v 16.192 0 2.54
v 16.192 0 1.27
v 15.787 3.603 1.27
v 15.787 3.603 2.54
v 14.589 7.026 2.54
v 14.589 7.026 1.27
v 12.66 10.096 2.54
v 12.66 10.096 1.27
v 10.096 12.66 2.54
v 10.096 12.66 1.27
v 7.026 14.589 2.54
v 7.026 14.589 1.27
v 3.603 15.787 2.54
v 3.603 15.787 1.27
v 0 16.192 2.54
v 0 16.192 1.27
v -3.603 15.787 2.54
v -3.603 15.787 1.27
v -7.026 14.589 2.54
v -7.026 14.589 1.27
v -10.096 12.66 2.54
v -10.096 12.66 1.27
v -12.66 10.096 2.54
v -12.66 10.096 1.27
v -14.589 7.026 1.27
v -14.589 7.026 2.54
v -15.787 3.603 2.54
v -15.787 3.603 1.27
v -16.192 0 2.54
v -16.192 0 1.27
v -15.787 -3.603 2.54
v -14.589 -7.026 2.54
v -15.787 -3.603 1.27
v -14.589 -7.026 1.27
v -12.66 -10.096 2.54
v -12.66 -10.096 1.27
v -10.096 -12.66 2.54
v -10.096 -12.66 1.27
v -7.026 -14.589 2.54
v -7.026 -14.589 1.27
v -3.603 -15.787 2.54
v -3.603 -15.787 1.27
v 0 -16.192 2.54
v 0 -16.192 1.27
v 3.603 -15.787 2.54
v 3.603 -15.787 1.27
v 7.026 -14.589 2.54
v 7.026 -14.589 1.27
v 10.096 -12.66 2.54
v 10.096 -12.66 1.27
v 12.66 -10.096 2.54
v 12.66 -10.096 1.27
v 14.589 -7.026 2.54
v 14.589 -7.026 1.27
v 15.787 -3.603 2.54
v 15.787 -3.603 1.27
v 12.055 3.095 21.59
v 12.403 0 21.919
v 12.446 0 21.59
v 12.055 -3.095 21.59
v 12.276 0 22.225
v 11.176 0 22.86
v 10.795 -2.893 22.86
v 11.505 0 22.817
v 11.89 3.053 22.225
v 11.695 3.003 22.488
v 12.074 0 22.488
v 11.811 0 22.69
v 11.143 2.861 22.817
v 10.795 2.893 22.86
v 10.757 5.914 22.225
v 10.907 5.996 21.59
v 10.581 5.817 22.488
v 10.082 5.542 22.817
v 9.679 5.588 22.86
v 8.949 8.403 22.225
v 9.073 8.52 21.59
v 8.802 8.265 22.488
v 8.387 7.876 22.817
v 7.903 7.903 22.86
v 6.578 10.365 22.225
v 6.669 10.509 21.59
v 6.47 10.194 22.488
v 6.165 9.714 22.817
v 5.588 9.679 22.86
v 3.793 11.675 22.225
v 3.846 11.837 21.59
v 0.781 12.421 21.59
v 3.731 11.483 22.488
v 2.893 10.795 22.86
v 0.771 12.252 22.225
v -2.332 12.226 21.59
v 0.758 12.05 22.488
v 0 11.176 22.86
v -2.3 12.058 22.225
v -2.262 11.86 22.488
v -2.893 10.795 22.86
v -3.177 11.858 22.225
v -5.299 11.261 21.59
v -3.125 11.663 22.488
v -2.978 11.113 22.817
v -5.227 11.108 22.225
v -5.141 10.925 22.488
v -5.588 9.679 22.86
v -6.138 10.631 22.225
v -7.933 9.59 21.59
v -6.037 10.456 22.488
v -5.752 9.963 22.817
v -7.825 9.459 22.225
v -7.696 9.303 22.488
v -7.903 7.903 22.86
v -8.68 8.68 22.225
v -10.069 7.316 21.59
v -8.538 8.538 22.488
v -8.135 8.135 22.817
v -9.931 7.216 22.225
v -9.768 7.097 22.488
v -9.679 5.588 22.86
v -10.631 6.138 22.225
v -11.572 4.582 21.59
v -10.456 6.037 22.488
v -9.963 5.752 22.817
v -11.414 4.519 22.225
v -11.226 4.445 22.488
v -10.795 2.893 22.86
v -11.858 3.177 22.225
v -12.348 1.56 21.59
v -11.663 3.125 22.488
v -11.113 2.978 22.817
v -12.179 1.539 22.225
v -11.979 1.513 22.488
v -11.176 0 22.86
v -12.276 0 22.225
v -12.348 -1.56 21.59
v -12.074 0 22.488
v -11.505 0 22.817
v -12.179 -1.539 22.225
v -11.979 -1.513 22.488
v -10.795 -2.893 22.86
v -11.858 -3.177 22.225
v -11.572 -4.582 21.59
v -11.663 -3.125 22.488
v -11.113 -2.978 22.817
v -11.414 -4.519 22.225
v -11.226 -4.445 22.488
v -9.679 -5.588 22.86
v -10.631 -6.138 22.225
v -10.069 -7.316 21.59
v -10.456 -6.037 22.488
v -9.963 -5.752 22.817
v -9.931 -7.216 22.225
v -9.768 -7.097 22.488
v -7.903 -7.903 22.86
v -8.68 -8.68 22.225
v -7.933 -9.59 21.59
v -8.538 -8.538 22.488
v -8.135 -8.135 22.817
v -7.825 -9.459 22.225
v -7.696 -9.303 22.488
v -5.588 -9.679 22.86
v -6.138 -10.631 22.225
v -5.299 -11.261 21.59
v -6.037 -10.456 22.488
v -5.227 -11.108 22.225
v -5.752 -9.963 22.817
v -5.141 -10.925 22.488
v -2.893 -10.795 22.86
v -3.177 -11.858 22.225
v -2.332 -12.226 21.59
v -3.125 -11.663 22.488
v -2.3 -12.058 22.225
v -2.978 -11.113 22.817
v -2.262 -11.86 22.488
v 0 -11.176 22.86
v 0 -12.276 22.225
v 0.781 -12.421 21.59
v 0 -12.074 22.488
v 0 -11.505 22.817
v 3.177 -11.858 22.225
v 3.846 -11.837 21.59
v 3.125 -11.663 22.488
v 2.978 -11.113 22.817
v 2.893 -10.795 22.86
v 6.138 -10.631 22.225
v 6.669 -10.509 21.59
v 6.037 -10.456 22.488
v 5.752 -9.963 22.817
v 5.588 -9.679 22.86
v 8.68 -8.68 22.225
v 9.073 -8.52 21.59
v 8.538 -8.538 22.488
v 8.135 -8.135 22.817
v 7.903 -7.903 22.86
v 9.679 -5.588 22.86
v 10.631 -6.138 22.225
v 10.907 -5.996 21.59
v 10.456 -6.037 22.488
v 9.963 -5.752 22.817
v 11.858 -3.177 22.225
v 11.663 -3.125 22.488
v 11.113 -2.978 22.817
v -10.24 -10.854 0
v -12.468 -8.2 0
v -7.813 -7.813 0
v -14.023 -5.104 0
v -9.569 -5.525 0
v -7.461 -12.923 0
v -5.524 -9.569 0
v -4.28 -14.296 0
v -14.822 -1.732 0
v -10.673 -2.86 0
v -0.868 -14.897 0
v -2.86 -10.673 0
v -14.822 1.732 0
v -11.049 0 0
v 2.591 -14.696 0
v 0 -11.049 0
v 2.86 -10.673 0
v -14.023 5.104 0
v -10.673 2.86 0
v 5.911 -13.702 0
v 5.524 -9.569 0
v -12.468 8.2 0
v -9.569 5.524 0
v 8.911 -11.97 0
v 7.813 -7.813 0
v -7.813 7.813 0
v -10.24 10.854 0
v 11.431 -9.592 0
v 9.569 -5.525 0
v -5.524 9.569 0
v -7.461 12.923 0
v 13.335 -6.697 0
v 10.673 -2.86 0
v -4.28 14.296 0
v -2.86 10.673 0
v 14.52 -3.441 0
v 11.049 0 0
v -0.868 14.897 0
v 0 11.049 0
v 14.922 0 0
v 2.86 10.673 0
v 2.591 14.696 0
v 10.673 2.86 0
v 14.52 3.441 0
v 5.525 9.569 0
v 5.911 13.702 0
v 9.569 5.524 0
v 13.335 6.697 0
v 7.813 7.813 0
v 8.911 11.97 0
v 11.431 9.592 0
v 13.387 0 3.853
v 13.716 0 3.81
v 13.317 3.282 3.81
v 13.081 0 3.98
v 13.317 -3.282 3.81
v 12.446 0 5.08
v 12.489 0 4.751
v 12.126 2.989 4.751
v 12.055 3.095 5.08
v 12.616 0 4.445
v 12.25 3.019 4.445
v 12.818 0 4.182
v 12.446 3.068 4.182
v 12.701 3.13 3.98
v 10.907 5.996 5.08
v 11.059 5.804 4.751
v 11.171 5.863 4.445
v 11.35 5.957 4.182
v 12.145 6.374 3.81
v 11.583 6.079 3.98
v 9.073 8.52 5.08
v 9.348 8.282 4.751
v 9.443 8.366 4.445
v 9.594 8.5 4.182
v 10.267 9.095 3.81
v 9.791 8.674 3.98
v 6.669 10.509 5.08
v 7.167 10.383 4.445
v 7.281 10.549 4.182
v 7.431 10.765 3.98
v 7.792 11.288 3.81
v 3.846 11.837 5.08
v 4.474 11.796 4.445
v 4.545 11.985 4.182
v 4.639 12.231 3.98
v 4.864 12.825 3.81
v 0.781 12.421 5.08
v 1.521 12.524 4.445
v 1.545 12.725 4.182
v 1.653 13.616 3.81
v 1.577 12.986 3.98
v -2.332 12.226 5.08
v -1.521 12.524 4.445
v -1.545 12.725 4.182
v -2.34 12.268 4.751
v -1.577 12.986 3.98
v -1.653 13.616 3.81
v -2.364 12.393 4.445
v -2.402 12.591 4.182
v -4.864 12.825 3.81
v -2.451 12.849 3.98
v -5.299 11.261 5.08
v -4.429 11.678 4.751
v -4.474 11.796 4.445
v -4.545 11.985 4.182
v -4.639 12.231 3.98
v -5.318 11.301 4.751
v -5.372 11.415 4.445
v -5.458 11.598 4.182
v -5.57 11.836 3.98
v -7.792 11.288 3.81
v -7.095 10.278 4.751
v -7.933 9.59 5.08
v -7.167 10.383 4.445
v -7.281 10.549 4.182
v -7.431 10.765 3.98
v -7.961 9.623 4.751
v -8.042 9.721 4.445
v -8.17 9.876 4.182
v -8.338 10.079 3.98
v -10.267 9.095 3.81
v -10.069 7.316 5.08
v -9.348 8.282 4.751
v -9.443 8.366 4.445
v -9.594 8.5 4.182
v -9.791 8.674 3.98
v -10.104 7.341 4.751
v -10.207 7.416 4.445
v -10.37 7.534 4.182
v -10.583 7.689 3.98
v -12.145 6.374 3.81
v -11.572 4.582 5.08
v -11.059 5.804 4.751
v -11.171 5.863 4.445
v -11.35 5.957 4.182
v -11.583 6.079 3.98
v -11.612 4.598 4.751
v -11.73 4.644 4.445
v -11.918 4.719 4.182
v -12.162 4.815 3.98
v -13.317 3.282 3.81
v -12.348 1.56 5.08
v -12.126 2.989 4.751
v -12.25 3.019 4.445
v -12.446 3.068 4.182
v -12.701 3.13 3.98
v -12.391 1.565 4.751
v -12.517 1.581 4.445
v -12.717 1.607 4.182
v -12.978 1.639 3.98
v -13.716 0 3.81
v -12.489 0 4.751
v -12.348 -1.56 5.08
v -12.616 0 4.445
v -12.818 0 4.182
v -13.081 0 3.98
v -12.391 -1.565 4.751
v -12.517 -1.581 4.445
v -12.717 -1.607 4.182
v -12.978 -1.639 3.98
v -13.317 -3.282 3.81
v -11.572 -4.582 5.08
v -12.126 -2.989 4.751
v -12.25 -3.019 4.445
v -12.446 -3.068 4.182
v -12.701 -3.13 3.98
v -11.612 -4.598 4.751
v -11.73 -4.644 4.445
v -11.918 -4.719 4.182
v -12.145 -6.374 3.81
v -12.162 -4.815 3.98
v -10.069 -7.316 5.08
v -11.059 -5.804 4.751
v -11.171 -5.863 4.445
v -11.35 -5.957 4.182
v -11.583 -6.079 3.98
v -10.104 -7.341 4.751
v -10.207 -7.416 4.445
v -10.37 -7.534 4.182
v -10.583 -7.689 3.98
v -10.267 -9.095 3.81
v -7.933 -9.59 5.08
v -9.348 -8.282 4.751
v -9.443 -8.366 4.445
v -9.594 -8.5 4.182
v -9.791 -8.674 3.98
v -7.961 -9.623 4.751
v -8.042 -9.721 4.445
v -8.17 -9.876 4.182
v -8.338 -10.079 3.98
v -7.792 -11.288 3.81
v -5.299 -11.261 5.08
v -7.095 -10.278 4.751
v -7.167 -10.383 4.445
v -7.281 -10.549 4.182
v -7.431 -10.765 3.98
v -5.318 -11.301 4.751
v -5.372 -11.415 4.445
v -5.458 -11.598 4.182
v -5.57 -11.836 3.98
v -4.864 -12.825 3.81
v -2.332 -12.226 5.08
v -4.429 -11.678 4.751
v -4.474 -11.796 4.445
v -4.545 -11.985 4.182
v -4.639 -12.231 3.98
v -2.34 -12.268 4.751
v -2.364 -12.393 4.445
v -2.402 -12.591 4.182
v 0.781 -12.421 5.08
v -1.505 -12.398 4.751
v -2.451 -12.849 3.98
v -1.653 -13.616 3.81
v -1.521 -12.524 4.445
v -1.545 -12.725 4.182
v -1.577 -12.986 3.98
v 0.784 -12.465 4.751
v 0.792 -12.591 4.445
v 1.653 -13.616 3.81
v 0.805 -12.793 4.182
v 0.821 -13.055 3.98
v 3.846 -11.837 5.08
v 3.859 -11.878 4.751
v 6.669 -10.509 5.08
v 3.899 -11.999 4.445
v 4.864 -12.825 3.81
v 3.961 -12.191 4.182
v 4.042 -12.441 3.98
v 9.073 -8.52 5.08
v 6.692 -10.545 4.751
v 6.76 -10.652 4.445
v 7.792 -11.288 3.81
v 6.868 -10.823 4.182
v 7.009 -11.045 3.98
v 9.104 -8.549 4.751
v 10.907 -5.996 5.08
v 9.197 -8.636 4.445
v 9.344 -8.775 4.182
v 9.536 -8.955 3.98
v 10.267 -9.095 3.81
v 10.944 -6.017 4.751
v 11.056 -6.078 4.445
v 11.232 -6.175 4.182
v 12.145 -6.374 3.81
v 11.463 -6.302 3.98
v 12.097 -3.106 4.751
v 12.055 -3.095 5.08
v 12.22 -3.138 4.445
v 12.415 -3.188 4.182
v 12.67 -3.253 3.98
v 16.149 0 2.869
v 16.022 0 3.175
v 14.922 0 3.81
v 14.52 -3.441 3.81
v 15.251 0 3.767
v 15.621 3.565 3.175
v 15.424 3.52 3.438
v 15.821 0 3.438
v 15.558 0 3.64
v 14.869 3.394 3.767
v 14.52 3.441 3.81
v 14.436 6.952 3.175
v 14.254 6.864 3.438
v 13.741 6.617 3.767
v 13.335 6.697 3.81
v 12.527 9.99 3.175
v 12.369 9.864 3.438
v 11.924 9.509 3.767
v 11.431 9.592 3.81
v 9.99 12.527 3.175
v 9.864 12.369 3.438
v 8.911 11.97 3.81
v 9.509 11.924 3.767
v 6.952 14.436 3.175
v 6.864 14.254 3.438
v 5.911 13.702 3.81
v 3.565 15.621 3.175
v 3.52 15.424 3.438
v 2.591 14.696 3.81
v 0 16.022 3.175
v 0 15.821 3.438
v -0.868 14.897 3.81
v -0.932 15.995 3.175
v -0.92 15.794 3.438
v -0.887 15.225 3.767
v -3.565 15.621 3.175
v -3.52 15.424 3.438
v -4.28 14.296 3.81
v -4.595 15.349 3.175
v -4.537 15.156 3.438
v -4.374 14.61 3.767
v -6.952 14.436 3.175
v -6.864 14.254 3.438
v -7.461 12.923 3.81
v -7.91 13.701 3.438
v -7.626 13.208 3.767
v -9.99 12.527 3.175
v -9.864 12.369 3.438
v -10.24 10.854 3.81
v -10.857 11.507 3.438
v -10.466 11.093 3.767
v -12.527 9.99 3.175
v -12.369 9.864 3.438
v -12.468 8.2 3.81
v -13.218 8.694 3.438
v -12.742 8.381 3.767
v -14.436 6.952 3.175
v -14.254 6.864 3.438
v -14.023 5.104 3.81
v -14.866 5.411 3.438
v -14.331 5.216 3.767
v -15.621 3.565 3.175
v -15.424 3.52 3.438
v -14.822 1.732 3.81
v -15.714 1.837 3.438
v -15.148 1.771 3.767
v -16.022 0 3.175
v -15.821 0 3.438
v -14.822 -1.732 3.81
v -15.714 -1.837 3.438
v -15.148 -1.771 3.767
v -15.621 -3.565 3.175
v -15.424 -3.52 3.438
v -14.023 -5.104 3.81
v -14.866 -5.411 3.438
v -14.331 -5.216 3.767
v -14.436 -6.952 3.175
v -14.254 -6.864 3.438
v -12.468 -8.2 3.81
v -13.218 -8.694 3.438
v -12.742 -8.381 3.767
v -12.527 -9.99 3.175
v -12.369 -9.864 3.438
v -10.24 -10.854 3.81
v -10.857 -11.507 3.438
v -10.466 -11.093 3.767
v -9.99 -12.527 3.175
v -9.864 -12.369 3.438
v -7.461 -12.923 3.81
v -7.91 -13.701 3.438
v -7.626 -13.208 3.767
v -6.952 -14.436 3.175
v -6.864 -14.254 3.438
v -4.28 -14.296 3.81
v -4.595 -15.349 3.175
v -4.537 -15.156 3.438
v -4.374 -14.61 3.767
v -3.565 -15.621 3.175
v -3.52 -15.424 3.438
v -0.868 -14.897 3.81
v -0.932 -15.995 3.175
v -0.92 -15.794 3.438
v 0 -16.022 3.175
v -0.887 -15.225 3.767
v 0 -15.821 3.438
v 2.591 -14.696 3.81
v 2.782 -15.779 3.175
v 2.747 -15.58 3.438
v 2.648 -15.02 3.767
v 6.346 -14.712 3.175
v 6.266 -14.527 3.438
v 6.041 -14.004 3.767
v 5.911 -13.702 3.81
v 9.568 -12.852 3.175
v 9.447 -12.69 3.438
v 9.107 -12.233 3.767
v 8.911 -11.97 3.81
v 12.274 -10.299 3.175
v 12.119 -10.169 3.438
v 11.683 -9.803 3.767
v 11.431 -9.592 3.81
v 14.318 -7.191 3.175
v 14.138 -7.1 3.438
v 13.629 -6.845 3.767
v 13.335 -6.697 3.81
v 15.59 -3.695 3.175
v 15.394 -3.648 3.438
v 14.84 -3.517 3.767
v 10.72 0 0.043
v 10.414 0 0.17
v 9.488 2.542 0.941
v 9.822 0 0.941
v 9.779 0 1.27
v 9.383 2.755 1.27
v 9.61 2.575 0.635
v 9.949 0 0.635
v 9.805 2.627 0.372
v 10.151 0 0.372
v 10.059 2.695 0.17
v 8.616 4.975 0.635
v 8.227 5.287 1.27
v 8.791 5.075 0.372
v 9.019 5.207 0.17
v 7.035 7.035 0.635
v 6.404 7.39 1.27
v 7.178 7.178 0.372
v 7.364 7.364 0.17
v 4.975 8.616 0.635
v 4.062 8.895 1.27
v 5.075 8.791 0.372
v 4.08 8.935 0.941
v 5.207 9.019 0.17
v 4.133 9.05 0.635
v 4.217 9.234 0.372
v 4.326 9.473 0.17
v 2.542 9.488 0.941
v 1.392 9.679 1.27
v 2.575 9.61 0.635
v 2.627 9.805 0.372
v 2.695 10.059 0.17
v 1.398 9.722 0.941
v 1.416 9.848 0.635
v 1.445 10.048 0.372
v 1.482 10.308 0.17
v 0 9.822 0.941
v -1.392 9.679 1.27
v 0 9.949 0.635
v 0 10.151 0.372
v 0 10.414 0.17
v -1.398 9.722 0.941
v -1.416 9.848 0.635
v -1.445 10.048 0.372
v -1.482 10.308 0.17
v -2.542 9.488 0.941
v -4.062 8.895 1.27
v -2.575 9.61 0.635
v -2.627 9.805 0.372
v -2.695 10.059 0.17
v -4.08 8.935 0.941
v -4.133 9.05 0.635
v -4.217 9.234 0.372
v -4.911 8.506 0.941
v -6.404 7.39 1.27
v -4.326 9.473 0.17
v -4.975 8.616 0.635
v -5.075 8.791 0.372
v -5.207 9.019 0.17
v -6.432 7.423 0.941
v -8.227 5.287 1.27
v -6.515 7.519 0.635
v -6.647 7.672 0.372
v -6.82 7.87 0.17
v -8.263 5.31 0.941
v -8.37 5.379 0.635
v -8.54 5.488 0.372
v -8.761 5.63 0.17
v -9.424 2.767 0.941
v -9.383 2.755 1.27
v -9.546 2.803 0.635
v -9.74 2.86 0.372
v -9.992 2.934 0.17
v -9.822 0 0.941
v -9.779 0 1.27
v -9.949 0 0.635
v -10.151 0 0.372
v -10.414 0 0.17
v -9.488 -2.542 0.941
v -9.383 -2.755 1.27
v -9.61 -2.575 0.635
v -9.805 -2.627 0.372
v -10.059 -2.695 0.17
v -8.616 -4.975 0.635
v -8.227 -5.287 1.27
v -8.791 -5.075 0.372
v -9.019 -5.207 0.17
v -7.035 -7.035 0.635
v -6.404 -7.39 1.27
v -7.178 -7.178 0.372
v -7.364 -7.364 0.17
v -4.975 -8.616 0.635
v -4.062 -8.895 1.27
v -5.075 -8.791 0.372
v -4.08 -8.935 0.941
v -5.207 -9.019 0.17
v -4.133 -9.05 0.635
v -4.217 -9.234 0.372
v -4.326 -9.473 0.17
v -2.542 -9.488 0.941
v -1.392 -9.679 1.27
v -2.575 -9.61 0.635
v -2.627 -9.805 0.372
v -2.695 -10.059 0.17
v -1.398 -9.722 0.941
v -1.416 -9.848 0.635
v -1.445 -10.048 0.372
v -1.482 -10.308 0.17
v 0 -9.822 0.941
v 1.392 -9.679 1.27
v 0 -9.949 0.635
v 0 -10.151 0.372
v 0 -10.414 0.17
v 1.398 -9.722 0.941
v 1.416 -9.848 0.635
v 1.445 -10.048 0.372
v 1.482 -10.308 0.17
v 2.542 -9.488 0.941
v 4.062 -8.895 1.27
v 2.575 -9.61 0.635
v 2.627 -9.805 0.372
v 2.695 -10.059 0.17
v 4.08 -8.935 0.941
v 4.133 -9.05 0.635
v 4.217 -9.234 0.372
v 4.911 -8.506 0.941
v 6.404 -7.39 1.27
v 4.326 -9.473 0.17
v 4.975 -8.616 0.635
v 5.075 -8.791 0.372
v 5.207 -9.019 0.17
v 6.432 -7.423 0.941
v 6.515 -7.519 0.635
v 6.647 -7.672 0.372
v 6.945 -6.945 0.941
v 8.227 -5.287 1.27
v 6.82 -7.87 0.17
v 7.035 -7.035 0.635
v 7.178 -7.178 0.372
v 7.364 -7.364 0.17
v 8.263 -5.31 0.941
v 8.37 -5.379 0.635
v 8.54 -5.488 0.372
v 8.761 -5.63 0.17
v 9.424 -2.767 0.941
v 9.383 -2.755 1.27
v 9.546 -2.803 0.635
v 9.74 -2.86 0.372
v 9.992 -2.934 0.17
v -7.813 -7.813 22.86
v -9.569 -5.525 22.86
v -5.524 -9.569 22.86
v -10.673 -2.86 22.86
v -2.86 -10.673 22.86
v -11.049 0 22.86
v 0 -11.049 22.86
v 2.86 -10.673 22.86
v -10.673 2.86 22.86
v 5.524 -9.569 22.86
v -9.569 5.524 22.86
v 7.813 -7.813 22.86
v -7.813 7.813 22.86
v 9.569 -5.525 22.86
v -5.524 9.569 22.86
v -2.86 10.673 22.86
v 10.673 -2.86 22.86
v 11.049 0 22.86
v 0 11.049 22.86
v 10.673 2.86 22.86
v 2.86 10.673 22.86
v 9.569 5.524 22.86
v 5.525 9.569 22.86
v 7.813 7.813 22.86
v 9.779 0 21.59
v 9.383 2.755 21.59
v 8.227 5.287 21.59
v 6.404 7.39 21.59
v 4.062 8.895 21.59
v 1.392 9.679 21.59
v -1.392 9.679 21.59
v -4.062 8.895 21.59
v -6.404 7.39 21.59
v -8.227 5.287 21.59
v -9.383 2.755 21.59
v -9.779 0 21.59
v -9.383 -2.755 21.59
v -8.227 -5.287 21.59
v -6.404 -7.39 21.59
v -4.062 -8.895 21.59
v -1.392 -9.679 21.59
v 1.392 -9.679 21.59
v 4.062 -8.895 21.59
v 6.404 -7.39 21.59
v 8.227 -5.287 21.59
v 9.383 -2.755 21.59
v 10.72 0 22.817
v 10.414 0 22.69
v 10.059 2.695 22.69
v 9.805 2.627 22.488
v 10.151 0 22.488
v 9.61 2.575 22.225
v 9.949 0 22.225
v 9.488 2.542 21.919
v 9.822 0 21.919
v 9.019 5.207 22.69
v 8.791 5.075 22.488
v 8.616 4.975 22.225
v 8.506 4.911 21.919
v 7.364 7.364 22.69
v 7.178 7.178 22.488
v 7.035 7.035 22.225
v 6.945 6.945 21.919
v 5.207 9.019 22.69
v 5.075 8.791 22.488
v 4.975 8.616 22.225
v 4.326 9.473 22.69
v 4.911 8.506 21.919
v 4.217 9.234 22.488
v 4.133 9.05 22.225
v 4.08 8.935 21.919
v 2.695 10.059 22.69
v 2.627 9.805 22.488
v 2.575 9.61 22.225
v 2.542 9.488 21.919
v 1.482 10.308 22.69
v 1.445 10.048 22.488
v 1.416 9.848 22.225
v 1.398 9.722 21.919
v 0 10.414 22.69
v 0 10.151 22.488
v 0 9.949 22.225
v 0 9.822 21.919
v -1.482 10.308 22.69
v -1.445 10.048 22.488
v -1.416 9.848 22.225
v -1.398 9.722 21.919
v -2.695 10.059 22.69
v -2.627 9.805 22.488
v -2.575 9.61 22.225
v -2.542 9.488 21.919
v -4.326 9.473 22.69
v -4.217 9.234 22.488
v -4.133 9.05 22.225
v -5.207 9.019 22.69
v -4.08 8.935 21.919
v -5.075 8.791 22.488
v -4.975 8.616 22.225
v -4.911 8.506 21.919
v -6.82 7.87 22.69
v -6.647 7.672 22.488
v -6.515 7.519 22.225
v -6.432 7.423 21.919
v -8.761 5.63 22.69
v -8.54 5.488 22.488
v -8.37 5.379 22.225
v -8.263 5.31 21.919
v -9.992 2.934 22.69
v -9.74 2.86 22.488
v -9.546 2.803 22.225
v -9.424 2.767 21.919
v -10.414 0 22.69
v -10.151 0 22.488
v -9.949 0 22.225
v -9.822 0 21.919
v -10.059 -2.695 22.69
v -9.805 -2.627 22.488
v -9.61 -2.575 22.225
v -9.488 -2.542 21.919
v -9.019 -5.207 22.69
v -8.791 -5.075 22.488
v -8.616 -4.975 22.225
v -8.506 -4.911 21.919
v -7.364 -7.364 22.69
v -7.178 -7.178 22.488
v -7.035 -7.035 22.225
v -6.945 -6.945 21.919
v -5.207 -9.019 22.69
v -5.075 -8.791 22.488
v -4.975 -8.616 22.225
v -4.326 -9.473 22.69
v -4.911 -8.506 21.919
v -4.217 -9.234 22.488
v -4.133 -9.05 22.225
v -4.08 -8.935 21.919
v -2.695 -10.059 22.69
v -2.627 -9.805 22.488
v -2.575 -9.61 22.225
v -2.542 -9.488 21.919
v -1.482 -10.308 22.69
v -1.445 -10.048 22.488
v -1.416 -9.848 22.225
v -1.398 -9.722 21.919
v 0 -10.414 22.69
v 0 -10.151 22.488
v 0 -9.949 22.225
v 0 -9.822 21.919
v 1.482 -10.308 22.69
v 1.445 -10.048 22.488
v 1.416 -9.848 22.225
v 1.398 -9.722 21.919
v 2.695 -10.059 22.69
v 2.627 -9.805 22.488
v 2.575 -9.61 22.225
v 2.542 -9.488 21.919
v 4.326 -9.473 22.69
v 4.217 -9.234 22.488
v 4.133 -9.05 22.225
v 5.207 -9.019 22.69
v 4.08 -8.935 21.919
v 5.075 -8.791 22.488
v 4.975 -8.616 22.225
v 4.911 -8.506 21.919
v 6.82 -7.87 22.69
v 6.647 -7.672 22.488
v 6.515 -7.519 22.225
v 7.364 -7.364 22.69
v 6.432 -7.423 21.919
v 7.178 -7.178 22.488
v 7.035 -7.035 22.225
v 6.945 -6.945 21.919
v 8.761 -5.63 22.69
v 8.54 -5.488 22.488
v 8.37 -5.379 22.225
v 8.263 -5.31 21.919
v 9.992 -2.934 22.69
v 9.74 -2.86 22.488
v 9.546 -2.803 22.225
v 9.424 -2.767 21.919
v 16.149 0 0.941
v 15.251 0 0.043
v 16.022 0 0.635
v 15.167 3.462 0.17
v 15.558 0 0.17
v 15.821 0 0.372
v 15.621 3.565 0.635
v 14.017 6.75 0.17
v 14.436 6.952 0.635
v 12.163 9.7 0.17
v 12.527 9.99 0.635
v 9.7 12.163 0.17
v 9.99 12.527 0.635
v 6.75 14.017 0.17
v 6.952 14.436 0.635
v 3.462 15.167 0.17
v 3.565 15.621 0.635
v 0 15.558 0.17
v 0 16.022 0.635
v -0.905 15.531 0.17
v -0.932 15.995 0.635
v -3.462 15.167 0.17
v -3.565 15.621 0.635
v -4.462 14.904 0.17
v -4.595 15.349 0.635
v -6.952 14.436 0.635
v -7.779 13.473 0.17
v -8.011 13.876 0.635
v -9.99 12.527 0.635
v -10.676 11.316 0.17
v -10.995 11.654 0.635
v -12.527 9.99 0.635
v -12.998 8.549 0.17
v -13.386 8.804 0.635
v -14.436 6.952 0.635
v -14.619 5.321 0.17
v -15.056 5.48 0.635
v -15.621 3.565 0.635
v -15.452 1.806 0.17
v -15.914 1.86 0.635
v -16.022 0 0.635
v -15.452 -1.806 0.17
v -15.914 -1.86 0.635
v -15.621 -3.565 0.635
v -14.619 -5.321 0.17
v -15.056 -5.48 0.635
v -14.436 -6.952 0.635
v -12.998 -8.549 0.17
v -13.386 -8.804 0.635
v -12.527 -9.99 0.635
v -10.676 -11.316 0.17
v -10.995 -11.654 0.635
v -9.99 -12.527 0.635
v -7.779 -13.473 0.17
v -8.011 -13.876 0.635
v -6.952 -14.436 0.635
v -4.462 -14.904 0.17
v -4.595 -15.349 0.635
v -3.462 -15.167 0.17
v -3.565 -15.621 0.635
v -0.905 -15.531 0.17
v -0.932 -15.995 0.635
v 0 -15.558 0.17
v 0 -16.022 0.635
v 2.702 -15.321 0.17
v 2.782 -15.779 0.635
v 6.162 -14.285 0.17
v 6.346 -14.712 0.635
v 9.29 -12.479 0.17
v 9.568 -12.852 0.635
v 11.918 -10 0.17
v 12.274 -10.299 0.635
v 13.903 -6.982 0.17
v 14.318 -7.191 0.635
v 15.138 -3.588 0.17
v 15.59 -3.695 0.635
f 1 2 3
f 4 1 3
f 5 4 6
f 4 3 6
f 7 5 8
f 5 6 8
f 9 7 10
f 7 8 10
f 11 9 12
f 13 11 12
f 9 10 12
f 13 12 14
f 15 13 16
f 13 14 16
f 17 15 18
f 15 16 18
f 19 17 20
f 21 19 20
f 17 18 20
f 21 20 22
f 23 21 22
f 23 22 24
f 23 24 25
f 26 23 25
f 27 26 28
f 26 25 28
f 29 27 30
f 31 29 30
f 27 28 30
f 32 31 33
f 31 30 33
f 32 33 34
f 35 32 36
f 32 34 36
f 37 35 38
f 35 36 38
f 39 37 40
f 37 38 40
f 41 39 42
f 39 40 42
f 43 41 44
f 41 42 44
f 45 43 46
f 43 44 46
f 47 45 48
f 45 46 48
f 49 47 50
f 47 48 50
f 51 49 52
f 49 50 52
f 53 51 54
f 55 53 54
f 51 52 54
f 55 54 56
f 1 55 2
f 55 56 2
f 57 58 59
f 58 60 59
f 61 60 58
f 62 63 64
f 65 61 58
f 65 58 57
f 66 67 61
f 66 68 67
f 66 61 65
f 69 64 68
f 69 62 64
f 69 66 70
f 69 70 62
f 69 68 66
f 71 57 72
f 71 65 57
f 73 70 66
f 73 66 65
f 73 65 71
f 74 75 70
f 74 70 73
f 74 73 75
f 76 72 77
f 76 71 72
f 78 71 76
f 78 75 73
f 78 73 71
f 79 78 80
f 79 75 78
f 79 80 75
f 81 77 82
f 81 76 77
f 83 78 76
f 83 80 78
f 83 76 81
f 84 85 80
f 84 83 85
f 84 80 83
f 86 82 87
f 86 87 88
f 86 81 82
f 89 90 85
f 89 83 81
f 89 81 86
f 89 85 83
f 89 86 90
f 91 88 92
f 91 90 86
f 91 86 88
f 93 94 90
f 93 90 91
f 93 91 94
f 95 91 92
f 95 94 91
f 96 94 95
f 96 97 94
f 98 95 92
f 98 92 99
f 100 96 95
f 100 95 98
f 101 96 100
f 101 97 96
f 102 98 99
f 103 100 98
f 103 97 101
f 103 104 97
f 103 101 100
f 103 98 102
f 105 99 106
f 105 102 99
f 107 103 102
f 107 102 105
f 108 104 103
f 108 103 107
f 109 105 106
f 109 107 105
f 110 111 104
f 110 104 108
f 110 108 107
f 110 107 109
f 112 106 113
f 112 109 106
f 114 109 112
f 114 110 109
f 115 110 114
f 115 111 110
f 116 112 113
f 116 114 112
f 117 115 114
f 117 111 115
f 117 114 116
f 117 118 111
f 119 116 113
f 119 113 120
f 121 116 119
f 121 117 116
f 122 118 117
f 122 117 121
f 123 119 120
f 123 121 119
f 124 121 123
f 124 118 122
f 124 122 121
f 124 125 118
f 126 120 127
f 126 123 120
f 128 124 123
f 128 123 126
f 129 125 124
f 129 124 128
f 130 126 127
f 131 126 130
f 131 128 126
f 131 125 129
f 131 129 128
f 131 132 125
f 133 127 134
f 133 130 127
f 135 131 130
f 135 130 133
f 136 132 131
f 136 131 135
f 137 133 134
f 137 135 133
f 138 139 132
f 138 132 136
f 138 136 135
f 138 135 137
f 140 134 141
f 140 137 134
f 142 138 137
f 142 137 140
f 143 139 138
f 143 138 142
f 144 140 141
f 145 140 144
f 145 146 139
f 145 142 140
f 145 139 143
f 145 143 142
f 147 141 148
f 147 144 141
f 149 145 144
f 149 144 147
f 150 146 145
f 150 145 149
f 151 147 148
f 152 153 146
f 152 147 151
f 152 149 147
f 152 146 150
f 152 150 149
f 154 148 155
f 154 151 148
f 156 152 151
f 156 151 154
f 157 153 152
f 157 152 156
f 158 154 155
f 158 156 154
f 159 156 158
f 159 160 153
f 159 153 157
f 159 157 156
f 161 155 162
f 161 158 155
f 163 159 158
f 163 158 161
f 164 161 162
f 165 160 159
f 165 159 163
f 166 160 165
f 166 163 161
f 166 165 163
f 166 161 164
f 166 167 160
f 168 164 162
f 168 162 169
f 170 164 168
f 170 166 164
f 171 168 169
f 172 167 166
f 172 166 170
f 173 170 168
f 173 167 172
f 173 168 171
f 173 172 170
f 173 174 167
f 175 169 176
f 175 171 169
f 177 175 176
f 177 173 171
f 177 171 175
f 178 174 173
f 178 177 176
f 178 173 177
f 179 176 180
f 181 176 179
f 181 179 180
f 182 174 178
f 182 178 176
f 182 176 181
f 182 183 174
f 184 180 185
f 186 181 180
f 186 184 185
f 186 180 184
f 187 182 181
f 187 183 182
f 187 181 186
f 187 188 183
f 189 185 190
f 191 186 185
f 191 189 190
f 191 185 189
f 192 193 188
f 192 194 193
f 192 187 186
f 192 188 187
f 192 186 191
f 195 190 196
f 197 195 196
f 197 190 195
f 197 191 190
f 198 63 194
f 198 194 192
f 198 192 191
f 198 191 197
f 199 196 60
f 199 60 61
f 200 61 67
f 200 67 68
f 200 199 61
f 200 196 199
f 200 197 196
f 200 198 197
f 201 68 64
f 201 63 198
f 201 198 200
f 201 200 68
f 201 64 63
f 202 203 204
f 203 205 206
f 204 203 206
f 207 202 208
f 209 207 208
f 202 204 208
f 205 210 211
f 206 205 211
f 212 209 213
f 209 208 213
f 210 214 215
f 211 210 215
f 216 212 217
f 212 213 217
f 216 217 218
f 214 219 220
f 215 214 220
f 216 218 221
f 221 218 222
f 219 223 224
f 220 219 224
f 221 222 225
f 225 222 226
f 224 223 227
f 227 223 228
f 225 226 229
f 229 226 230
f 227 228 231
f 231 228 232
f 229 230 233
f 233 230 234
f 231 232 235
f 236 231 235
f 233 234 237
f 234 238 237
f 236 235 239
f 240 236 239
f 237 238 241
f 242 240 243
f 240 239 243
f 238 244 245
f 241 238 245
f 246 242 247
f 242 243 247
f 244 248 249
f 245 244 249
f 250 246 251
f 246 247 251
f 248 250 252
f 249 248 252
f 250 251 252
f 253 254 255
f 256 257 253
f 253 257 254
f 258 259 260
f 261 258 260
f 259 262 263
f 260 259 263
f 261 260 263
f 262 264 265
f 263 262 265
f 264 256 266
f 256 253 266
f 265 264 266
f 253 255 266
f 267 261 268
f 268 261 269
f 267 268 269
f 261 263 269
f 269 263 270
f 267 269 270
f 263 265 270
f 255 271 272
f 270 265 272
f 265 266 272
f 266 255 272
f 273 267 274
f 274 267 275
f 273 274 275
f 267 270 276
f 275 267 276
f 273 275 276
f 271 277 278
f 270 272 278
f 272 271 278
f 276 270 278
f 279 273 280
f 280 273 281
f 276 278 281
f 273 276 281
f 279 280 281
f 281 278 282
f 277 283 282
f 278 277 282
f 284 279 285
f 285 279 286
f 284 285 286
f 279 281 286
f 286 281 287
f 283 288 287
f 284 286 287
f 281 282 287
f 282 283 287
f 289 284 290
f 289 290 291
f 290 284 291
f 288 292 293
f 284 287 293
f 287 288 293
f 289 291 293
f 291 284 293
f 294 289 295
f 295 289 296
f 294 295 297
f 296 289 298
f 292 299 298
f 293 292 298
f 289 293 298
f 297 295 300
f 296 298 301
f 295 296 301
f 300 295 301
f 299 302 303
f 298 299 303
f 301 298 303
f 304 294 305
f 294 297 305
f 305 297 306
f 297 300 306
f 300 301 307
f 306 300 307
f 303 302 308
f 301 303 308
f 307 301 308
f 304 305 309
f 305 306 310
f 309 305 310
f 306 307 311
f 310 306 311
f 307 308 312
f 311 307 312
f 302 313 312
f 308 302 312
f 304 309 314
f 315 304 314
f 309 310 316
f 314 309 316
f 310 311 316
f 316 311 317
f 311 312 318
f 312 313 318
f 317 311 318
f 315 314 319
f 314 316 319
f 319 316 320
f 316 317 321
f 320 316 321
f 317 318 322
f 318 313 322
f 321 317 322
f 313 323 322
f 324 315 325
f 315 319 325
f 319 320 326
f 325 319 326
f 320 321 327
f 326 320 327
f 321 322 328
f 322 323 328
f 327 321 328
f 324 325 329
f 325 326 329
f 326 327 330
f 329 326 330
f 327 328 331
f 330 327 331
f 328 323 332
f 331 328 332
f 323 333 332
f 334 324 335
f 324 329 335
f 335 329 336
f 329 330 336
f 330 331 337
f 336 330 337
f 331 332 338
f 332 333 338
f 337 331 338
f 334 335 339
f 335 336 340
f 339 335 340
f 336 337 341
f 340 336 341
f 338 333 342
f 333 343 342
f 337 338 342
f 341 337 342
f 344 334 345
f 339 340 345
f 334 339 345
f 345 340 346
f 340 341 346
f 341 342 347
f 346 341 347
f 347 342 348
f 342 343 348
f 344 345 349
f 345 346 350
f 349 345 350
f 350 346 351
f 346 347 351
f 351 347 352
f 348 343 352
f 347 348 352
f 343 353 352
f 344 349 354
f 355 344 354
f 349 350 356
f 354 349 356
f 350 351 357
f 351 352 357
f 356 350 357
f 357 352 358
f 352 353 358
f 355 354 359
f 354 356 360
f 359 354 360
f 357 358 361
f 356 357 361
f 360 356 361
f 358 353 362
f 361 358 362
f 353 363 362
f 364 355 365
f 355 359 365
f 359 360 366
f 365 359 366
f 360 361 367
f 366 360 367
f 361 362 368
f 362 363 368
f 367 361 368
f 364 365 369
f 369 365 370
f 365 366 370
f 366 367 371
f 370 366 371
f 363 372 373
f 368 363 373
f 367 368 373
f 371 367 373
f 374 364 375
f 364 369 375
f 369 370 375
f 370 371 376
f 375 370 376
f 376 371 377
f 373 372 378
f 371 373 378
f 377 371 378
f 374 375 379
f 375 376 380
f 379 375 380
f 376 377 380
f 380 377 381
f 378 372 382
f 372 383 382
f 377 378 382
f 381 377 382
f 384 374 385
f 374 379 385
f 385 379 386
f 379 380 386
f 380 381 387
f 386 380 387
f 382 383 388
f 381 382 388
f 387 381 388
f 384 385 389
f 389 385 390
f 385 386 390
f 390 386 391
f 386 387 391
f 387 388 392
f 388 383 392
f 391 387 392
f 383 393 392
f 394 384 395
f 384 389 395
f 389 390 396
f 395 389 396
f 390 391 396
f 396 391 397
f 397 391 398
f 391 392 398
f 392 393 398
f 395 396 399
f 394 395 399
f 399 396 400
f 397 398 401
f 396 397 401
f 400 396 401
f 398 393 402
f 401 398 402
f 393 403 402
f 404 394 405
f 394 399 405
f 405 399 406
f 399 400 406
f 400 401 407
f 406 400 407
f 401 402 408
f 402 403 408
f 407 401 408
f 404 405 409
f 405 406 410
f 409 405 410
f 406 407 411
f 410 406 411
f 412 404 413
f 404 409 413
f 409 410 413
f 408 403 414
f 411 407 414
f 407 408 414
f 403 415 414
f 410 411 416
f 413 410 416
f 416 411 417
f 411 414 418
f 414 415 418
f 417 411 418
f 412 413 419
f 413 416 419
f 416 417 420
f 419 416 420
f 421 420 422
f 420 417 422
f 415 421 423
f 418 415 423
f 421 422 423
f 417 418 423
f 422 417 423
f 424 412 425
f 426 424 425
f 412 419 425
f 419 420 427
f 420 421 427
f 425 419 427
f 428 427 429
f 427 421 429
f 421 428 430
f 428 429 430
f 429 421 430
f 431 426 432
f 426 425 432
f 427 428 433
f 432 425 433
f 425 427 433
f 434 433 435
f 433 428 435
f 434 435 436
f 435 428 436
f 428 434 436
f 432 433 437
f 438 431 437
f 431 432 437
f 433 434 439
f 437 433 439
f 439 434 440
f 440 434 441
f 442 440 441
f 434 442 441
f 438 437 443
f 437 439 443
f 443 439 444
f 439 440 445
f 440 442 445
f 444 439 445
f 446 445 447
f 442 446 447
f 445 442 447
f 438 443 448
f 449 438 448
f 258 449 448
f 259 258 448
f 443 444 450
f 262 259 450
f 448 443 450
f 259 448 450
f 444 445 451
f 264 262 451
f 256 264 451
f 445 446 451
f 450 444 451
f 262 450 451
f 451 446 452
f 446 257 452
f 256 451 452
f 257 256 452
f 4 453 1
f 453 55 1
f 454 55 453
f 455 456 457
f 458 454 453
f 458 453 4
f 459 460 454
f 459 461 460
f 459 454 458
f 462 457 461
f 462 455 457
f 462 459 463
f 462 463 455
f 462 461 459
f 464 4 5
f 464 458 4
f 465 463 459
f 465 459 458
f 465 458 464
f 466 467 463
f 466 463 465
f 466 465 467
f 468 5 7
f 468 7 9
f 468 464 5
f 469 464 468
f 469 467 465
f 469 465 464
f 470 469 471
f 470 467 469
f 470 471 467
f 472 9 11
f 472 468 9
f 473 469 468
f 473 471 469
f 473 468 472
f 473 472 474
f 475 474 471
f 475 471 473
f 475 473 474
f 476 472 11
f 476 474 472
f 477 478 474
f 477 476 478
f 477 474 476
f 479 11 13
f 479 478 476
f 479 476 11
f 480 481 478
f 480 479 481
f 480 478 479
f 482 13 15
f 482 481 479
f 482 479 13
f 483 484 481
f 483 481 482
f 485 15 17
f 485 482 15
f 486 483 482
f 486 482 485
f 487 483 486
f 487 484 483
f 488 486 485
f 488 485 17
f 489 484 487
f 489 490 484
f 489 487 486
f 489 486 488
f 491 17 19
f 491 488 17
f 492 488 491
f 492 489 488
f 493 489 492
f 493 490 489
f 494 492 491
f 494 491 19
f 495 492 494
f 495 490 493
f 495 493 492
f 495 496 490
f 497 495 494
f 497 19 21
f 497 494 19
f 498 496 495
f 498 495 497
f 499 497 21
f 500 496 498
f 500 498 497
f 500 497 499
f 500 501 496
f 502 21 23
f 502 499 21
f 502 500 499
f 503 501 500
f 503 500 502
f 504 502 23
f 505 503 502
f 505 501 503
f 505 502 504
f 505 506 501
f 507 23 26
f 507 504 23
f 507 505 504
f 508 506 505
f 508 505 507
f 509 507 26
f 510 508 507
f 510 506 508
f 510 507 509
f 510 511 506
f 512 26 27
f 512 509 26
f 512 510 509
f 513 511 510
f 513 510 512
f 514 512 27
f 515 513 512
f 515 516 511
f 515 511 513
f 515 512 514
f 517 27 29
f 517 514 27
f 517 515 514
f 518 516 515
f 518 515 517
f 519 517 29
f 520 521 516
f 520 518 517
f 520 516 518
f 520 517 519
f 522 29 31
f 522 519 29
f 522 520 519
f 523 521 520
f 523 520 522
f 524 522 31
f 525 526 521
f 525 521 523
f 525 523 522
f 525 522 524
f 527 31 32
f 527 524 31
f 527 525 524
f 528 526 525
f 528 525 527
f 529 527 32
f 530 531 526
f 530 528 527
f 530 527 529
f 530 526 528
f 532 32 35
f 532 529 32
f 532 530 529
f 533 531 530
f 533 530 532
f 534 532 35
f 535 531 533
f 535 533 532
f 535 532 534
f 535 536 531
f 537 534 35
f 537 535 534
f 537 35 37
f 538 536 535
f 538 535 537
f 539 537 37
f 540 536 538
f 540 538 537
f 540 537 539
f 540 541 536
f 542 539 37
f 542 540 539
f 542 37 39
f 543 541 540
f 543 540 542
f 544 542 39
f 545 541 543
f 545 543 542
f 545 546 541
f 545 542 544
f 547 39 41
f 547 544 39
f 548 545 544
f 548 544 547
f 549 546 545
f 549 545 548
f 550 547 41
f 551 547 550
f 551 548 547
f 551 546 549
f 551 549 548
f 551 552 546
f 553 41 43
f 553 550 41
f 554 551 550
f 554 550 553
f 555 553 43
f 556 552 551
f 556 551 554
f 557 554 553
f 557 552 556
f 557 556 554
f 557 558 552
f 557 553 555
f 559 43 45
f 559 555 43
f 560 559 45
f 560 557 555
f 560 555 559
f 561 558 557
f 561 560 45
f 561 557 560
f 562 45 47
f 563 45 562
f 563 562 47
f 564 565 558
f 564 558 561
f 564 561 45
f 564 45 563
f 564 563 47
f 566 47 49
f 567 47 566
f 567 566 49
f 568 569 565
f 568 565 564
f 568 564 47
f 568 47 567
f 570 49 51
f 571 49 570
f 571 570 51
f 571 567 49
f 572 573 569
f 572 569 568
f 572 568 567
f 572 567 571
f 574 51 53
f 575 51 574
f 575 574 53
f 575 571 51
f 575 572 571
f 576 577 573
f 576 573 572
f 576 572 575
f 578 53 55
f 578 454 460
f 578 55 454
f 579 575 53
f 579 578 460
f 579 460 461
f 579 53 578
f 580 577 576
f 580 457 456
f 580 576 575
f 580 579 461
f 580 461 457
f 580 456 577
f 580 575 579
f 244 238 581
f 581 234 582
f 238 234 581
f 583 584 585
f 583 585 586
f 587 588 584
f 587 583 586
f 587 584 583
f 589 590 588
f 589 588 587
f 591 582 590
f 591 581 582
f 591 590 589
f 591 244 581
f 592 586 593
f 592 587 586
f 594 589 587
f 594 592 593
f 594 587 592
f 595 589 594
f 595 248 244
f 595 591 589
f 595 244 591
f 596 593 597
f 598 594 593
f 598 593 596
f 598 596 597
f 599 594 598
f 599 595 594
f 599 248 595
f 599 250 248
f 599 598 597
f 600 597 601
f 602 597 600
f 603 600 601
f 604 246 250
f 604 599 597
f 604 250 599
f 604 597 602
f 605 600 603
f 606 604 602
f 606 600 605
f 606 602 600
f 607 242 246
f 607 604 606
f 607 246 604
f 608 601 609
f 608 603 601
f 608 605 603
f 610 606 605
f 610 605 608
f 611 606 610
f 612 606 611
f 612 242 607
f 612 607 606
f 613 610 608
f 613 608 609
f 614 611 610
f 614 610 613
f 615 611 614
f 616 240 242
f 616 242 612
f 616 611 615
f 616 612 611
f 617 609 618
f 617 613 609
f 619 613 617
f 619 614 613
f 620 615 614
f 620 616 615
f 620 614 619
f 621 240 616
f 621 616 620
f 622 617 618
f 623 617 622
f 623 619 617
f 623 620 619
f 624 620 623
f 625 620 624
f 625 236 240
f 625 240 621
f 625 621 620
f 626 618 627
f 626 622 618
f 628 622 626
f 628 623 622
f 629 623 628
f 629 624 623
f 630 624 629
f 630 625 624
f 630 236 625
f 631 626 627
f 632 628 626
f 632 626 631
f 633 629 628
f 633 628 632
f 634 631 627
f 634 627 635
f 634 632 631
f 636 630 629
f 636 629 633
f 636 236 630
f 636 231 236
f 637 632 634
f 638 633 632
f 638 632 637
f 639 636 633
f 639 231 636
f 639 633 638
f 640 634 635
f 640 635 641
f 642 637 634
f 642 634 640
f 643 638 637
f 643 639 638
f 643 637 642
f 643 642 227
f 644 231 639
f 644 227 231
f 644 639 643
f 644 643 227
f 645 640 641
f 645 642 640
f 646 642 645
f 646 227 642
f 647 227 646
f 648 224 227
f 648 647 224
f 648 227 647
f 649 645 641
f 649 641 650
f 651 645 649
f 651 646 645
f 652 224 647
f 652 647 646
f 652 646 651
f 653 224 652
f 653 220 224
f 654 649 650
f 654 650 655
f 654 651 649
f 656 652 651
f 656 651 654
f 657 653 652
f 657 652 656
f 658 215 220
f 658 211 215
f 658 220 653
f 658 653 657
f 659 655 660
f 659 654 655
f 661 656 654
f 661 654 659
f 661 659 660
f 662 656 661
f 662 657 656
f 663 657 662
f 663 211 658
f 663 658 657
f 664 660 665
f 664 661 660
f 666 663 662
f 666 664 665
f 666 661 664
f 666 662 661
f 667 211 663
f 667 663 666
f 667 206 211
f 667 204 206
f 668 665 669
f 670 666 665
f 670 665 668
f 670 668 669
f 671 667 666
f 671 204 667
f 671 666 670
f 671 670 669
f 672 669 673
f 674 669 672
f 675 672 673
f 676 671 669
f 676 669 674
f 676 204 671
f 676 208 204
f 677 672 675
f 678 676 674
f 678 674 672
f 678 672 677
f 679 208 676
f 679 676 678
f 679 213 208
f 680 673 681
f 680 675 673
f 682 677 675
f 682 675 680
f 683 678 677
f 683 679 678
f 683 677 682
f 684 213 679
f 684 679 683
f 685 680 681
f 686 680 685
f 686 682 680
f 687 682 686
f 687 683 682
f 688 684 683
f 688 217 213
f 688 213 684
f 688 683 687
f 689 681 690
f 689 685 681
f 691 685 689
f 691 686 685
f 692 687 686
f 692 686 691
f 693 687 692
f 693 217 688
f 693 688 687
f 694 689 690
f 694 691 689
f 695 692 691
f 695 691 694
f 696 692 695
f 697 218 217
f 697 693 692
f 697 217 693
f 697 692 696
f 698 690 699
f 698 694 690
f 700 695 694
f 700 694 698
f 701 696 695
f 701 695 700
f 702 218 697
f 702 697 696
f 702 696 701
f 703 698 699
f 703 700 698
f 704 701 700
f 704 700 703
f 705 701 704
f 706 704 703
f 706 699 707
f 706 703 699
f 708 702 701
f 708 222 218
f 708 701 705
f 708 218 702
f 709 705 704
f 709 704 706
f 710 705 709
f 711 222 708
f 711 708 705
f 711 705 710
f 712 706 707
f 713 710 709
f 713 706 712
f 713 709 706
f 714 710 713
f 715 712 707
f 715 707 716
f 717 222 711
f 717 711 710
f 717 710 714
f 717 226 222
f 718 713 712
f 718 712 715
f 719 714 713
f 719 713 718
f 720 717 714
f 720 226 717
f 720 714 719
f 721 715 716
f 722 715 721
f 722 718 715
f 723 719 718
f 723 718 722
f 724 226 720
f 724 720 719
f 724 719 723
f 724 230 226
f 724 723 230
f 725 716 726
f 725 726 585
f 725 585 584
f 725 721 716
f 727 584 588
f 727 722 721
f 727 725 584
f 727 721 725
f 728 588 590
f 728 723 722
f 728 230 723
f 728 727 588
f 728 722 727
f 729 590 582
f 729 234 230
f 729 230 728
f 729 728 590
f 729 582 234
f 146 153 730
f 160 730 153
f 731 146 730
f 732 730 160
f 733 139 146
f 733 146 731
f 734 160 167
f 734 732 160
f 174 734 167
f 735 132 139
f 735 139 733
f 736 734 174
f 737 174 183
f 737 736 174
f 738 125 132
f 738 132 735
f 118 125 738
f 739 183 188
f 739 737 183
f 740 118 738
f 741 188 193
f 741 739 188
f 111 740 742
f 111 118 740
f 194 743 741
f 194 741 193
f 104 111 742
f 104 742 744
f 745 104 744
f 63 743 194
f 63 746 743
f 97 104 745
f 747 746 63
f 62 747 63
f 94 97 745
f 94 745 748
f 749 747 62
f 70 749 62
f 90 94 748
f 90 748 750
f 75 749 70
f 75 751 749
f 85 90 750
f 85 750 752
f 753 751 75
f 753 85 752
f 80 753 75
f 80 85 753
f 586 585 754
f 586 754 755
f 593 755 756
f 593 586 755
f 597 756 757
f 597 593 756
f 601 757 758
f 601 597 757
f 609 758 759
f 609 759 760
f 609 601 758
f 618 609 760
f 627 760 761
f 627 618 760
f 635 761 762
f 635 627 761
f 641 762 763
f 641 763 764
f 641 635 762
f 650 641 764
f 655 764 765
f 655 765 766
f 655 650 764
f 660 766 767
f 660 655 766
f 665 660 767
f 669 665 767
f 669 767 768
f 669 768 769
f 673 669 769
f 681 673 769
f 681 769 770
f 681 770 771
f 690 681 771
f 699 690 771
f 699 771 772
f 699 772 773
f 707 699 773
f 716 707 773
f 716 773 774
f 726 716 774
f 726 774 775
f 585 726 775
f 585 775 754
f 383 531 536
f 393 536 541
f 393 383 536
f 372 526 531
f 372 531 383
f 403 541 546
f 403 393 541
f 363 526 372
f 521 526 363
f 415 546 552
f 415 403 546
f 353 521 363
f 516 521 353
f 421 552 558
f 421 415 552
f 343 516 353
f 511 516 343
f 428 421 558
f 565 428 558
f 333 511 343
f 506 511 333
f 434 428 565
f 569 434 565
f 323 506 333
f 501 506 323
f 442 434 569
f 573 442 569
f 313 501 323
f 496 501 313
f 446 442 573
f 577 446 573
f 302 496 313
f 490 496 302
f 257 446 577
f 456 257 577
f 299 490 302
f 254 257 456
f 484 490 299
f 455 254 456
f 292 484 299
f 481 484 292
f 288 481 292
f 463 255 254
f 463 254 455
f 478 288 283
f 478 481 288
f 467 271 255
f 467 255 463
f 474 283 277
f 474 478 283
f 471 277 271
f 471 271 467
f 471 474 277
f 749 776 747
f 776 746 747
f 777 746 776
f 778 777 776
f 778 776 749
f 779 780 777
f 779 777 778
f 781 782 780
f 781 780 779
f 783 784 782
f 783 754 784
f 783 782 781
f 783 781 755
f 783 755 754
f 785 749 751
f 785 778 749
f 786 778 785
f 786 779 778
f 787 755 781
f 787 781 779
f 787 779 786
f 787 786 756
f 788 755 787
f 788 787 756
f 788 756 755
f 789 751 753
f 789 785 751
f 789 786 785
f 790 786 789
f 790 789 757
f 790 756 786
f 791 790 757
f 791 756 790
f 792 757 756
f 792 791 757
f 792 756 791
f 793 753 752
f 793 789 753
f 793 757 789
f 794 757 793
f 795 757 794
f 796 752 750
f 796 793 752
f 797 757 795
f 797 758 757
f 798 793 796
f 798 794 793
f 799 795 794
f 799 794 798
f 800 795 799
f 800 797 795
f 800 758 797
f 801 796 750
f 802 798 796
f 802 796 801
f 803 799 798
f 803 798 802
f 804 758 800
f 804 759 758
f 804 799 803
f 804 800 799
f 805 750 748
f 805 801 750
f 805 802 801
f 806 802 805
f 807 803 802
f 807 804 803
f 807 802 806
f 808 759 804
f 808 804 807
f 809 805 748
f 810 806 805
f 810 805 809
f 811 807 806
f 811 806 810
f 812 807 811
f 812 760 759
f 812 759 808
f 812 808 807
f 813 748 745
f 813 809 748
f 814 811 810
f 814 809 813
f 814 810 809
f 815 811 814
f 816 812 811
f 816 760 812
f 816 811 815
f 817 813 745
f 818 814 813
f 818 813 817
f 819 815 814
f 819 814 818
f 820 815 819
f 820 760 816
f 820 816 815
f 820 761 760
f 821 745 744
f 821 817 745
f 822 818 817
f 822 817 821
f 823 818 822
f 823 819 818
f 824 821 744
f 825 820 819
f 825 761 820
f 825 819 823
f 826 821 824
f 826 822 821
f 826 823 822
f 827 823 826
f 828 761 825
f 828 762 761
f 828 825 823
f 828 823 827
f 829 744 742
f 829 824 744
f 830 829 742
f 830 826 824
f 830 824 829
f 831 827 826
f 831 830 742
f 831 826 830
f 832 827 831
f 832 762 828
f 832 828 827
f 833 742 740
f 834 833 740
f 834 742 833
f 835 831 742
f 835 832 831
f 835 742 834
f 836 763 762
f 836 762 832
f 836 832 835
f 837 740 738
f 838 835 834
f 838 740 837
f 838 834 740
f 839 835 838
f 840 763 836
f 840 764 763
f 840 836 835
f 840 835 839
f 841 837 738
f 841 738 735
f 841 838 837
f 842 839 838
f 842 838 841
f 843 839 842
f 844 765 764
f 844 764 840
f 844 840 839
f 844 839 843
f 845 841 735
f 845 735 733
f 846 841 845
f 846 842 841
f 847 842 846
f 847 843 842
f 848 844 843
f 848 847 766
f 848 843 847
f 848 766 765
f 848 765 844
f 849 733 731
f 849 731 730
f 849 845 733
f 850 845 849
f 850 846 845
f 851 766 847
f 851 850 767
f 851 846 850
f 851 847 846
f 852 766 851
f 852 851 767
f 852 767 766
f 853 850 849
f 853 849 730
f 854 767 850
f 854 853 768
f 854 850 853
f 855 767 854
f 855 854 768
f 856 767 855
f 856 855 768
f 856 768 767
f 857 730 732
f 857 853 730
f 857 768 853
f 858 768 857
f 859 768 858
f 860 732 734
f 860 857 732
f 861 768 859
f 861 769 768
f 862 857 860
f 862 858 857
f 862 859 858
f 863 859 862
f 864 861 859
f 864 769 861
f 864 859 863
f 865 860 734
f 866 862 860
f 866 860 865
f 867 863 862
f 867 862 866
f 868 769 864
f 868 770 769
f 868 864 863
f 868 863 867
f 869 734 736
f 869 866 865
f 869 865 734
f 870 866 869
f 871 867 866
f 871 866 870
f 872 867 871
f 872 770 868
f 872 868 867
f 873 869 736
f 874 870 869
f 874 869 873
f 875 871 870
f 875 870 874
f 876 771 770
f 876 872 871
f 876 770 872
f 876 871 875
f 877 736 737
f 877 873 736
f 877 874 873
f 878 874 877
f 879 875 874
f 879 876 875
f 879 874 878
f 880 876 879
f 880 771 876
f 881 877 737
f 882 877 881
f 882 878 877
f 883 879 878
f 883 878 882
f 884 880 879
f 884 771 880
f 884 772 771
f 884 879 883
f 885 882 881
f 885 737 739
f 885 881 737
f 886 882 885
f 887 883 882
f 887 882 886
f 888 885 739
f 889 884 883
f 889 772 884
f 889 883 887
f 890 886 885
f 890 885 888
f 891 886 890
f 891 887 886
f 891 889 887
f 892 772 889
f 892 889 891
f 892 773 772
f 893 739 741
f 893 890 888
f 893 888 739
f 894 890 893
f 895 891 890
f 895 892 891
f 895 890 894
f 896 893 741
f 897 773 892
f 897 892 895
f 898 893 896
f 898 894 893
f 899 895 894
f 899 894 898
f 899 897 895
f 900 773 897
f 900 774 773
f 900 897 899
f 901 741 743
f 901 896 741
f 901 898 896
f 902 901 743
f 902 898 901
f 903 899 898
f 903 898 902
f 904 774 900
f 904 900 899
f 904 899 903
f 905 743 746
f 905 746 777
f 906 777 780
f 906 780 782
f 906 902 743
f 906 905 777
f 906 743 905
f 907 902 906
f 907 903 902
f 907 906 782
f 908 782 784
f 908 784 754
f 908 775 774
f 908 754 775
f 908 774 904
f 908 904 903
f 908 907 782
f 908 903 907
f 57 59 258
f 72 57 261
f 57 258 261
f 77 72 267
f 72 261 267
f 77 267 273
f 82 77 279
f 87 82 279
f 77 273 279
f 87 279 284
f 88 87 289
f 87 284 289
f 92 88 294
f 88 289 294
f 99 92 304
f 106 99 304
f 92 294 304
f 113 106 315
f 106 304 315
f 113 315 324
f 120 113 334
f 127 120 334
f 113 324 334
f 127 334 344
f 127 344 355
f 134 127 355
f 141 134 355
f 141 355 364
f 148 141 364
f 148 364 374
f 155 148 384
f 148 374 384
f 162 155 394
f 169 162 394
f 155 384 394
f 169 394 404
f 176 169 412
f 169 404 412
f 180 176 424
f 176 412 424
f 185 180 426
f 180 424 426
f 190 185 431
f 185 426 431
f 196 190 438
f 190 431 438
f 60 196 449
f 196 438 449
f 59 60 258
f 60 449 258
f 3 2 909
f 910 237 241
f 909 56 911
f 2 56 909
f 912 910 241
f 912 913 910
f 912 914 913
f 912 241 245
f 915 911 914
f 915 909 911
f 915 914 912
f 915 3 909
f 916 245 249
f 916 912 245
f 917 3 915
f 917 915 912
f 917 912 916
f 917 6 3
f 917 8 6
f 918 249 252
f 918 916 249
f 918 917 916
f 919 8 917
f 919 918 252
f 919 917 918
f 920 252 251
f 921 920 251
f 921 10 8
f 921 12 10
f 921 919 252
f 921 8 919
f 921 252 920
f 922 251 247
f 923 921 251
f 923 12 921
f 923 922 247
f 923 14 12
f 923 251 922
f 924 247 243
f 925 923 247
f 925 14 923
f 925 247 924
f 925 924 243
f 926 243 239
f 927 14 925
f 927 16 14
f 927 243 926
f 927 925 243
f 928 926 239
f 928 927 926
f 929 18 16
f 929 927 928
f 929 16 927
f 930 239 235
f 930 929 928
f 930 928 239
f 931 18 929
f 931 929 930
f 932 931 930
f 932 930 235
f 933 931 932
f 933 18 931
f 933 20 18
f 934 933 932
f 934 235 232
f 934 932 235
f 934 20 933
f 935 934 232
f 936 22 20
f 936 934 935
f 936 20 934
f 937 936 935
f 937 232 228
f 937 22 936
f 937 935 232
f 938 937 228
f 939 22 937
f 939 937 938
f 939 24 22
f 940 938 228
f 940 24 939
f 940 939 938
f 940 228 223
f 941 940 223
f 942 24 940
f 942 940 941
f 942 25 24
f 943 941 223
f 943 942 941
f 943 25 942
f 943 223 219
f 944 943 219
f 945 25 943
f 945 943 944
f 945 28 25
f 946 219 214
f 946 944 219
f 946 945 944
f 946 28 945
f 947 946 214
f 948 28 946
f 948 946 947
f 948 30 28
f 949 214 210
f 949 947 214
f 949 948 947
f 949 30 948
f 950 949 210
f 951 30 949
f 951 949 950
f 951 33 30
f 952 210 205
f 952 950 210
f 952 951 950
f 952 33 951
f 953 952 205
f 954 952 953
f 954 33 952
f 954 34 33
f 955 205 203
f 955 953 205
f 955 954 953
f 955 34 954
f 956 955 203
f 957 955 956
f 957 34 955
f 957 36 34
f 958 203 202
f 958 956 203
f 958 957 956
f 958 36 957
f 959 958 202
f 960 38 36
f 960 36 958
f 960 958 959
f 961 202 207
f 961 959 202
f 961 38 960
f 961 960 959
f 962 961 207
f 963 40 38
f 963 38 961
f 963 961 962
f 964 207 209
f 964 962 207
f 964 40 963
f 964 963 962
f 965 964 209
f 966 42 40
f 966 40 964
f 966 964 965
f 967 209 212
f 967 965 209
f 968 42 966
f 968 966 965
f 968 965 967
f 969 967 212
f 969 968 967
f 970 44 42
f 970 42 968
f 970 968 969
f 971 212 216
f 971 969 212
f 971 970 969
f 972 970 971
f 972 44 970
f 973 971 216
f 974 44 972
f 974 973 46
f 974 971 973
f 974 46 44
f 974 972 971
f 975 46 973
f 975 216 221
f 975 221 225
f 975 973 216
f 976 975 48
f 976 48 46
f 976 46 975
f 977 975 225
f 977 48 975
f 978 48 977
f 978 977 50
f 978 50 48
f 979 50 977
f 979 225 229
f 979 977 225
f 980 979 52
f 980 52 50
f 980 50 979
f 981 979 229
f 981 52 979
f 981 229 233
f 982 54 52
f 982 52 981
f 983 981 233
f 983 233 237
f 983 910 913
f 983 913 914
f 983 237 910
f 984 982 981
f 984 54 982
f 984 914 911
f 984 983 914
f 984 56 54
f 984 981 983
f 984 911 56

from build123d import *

# Parameters (mm, degrees)
F0_R     = 16.1925
F0_R_2   = 9.779
F1_DEPTH = 3.81
F2_R     = 12.446
F2_R_2   = 9.779
F3_DEPTH = 19.05
F4_R     = 1.27


with BuildPart() as f1:
    # F0 (on Top) → F1 (new body)
    with BuildSketch(Plane.XY):
        Circle(F0_R)
        Circle(F0_R_2, mode=Mode.SUBTRACT)
    extrude(amount=F1_DEPTH)

    # F2 (on face) → F3 (join)
    with BuildSketch(Plane.XY.offset(3.81)):
        Circle(F2_R)
        Circle(F2_R_2, mode=Mode.SUBTRACT)
    extrude(amount=F3_DEPTH)

    # F4
    f4_edges = [f1.edges().sort_by_distance(p)[0] for p in [
        (-12.446, 0, 22.86),
        (-16.1925, 0, 3.81),
        (-9.779, 0, 22.86),
        (-16.1925, 0, 0),
        (-9.779, 0, 0),
        (-12.446, 0, 3.81),
    ]]
    fillet(f4_edges, radius=F4_R)


solid = f1.part
